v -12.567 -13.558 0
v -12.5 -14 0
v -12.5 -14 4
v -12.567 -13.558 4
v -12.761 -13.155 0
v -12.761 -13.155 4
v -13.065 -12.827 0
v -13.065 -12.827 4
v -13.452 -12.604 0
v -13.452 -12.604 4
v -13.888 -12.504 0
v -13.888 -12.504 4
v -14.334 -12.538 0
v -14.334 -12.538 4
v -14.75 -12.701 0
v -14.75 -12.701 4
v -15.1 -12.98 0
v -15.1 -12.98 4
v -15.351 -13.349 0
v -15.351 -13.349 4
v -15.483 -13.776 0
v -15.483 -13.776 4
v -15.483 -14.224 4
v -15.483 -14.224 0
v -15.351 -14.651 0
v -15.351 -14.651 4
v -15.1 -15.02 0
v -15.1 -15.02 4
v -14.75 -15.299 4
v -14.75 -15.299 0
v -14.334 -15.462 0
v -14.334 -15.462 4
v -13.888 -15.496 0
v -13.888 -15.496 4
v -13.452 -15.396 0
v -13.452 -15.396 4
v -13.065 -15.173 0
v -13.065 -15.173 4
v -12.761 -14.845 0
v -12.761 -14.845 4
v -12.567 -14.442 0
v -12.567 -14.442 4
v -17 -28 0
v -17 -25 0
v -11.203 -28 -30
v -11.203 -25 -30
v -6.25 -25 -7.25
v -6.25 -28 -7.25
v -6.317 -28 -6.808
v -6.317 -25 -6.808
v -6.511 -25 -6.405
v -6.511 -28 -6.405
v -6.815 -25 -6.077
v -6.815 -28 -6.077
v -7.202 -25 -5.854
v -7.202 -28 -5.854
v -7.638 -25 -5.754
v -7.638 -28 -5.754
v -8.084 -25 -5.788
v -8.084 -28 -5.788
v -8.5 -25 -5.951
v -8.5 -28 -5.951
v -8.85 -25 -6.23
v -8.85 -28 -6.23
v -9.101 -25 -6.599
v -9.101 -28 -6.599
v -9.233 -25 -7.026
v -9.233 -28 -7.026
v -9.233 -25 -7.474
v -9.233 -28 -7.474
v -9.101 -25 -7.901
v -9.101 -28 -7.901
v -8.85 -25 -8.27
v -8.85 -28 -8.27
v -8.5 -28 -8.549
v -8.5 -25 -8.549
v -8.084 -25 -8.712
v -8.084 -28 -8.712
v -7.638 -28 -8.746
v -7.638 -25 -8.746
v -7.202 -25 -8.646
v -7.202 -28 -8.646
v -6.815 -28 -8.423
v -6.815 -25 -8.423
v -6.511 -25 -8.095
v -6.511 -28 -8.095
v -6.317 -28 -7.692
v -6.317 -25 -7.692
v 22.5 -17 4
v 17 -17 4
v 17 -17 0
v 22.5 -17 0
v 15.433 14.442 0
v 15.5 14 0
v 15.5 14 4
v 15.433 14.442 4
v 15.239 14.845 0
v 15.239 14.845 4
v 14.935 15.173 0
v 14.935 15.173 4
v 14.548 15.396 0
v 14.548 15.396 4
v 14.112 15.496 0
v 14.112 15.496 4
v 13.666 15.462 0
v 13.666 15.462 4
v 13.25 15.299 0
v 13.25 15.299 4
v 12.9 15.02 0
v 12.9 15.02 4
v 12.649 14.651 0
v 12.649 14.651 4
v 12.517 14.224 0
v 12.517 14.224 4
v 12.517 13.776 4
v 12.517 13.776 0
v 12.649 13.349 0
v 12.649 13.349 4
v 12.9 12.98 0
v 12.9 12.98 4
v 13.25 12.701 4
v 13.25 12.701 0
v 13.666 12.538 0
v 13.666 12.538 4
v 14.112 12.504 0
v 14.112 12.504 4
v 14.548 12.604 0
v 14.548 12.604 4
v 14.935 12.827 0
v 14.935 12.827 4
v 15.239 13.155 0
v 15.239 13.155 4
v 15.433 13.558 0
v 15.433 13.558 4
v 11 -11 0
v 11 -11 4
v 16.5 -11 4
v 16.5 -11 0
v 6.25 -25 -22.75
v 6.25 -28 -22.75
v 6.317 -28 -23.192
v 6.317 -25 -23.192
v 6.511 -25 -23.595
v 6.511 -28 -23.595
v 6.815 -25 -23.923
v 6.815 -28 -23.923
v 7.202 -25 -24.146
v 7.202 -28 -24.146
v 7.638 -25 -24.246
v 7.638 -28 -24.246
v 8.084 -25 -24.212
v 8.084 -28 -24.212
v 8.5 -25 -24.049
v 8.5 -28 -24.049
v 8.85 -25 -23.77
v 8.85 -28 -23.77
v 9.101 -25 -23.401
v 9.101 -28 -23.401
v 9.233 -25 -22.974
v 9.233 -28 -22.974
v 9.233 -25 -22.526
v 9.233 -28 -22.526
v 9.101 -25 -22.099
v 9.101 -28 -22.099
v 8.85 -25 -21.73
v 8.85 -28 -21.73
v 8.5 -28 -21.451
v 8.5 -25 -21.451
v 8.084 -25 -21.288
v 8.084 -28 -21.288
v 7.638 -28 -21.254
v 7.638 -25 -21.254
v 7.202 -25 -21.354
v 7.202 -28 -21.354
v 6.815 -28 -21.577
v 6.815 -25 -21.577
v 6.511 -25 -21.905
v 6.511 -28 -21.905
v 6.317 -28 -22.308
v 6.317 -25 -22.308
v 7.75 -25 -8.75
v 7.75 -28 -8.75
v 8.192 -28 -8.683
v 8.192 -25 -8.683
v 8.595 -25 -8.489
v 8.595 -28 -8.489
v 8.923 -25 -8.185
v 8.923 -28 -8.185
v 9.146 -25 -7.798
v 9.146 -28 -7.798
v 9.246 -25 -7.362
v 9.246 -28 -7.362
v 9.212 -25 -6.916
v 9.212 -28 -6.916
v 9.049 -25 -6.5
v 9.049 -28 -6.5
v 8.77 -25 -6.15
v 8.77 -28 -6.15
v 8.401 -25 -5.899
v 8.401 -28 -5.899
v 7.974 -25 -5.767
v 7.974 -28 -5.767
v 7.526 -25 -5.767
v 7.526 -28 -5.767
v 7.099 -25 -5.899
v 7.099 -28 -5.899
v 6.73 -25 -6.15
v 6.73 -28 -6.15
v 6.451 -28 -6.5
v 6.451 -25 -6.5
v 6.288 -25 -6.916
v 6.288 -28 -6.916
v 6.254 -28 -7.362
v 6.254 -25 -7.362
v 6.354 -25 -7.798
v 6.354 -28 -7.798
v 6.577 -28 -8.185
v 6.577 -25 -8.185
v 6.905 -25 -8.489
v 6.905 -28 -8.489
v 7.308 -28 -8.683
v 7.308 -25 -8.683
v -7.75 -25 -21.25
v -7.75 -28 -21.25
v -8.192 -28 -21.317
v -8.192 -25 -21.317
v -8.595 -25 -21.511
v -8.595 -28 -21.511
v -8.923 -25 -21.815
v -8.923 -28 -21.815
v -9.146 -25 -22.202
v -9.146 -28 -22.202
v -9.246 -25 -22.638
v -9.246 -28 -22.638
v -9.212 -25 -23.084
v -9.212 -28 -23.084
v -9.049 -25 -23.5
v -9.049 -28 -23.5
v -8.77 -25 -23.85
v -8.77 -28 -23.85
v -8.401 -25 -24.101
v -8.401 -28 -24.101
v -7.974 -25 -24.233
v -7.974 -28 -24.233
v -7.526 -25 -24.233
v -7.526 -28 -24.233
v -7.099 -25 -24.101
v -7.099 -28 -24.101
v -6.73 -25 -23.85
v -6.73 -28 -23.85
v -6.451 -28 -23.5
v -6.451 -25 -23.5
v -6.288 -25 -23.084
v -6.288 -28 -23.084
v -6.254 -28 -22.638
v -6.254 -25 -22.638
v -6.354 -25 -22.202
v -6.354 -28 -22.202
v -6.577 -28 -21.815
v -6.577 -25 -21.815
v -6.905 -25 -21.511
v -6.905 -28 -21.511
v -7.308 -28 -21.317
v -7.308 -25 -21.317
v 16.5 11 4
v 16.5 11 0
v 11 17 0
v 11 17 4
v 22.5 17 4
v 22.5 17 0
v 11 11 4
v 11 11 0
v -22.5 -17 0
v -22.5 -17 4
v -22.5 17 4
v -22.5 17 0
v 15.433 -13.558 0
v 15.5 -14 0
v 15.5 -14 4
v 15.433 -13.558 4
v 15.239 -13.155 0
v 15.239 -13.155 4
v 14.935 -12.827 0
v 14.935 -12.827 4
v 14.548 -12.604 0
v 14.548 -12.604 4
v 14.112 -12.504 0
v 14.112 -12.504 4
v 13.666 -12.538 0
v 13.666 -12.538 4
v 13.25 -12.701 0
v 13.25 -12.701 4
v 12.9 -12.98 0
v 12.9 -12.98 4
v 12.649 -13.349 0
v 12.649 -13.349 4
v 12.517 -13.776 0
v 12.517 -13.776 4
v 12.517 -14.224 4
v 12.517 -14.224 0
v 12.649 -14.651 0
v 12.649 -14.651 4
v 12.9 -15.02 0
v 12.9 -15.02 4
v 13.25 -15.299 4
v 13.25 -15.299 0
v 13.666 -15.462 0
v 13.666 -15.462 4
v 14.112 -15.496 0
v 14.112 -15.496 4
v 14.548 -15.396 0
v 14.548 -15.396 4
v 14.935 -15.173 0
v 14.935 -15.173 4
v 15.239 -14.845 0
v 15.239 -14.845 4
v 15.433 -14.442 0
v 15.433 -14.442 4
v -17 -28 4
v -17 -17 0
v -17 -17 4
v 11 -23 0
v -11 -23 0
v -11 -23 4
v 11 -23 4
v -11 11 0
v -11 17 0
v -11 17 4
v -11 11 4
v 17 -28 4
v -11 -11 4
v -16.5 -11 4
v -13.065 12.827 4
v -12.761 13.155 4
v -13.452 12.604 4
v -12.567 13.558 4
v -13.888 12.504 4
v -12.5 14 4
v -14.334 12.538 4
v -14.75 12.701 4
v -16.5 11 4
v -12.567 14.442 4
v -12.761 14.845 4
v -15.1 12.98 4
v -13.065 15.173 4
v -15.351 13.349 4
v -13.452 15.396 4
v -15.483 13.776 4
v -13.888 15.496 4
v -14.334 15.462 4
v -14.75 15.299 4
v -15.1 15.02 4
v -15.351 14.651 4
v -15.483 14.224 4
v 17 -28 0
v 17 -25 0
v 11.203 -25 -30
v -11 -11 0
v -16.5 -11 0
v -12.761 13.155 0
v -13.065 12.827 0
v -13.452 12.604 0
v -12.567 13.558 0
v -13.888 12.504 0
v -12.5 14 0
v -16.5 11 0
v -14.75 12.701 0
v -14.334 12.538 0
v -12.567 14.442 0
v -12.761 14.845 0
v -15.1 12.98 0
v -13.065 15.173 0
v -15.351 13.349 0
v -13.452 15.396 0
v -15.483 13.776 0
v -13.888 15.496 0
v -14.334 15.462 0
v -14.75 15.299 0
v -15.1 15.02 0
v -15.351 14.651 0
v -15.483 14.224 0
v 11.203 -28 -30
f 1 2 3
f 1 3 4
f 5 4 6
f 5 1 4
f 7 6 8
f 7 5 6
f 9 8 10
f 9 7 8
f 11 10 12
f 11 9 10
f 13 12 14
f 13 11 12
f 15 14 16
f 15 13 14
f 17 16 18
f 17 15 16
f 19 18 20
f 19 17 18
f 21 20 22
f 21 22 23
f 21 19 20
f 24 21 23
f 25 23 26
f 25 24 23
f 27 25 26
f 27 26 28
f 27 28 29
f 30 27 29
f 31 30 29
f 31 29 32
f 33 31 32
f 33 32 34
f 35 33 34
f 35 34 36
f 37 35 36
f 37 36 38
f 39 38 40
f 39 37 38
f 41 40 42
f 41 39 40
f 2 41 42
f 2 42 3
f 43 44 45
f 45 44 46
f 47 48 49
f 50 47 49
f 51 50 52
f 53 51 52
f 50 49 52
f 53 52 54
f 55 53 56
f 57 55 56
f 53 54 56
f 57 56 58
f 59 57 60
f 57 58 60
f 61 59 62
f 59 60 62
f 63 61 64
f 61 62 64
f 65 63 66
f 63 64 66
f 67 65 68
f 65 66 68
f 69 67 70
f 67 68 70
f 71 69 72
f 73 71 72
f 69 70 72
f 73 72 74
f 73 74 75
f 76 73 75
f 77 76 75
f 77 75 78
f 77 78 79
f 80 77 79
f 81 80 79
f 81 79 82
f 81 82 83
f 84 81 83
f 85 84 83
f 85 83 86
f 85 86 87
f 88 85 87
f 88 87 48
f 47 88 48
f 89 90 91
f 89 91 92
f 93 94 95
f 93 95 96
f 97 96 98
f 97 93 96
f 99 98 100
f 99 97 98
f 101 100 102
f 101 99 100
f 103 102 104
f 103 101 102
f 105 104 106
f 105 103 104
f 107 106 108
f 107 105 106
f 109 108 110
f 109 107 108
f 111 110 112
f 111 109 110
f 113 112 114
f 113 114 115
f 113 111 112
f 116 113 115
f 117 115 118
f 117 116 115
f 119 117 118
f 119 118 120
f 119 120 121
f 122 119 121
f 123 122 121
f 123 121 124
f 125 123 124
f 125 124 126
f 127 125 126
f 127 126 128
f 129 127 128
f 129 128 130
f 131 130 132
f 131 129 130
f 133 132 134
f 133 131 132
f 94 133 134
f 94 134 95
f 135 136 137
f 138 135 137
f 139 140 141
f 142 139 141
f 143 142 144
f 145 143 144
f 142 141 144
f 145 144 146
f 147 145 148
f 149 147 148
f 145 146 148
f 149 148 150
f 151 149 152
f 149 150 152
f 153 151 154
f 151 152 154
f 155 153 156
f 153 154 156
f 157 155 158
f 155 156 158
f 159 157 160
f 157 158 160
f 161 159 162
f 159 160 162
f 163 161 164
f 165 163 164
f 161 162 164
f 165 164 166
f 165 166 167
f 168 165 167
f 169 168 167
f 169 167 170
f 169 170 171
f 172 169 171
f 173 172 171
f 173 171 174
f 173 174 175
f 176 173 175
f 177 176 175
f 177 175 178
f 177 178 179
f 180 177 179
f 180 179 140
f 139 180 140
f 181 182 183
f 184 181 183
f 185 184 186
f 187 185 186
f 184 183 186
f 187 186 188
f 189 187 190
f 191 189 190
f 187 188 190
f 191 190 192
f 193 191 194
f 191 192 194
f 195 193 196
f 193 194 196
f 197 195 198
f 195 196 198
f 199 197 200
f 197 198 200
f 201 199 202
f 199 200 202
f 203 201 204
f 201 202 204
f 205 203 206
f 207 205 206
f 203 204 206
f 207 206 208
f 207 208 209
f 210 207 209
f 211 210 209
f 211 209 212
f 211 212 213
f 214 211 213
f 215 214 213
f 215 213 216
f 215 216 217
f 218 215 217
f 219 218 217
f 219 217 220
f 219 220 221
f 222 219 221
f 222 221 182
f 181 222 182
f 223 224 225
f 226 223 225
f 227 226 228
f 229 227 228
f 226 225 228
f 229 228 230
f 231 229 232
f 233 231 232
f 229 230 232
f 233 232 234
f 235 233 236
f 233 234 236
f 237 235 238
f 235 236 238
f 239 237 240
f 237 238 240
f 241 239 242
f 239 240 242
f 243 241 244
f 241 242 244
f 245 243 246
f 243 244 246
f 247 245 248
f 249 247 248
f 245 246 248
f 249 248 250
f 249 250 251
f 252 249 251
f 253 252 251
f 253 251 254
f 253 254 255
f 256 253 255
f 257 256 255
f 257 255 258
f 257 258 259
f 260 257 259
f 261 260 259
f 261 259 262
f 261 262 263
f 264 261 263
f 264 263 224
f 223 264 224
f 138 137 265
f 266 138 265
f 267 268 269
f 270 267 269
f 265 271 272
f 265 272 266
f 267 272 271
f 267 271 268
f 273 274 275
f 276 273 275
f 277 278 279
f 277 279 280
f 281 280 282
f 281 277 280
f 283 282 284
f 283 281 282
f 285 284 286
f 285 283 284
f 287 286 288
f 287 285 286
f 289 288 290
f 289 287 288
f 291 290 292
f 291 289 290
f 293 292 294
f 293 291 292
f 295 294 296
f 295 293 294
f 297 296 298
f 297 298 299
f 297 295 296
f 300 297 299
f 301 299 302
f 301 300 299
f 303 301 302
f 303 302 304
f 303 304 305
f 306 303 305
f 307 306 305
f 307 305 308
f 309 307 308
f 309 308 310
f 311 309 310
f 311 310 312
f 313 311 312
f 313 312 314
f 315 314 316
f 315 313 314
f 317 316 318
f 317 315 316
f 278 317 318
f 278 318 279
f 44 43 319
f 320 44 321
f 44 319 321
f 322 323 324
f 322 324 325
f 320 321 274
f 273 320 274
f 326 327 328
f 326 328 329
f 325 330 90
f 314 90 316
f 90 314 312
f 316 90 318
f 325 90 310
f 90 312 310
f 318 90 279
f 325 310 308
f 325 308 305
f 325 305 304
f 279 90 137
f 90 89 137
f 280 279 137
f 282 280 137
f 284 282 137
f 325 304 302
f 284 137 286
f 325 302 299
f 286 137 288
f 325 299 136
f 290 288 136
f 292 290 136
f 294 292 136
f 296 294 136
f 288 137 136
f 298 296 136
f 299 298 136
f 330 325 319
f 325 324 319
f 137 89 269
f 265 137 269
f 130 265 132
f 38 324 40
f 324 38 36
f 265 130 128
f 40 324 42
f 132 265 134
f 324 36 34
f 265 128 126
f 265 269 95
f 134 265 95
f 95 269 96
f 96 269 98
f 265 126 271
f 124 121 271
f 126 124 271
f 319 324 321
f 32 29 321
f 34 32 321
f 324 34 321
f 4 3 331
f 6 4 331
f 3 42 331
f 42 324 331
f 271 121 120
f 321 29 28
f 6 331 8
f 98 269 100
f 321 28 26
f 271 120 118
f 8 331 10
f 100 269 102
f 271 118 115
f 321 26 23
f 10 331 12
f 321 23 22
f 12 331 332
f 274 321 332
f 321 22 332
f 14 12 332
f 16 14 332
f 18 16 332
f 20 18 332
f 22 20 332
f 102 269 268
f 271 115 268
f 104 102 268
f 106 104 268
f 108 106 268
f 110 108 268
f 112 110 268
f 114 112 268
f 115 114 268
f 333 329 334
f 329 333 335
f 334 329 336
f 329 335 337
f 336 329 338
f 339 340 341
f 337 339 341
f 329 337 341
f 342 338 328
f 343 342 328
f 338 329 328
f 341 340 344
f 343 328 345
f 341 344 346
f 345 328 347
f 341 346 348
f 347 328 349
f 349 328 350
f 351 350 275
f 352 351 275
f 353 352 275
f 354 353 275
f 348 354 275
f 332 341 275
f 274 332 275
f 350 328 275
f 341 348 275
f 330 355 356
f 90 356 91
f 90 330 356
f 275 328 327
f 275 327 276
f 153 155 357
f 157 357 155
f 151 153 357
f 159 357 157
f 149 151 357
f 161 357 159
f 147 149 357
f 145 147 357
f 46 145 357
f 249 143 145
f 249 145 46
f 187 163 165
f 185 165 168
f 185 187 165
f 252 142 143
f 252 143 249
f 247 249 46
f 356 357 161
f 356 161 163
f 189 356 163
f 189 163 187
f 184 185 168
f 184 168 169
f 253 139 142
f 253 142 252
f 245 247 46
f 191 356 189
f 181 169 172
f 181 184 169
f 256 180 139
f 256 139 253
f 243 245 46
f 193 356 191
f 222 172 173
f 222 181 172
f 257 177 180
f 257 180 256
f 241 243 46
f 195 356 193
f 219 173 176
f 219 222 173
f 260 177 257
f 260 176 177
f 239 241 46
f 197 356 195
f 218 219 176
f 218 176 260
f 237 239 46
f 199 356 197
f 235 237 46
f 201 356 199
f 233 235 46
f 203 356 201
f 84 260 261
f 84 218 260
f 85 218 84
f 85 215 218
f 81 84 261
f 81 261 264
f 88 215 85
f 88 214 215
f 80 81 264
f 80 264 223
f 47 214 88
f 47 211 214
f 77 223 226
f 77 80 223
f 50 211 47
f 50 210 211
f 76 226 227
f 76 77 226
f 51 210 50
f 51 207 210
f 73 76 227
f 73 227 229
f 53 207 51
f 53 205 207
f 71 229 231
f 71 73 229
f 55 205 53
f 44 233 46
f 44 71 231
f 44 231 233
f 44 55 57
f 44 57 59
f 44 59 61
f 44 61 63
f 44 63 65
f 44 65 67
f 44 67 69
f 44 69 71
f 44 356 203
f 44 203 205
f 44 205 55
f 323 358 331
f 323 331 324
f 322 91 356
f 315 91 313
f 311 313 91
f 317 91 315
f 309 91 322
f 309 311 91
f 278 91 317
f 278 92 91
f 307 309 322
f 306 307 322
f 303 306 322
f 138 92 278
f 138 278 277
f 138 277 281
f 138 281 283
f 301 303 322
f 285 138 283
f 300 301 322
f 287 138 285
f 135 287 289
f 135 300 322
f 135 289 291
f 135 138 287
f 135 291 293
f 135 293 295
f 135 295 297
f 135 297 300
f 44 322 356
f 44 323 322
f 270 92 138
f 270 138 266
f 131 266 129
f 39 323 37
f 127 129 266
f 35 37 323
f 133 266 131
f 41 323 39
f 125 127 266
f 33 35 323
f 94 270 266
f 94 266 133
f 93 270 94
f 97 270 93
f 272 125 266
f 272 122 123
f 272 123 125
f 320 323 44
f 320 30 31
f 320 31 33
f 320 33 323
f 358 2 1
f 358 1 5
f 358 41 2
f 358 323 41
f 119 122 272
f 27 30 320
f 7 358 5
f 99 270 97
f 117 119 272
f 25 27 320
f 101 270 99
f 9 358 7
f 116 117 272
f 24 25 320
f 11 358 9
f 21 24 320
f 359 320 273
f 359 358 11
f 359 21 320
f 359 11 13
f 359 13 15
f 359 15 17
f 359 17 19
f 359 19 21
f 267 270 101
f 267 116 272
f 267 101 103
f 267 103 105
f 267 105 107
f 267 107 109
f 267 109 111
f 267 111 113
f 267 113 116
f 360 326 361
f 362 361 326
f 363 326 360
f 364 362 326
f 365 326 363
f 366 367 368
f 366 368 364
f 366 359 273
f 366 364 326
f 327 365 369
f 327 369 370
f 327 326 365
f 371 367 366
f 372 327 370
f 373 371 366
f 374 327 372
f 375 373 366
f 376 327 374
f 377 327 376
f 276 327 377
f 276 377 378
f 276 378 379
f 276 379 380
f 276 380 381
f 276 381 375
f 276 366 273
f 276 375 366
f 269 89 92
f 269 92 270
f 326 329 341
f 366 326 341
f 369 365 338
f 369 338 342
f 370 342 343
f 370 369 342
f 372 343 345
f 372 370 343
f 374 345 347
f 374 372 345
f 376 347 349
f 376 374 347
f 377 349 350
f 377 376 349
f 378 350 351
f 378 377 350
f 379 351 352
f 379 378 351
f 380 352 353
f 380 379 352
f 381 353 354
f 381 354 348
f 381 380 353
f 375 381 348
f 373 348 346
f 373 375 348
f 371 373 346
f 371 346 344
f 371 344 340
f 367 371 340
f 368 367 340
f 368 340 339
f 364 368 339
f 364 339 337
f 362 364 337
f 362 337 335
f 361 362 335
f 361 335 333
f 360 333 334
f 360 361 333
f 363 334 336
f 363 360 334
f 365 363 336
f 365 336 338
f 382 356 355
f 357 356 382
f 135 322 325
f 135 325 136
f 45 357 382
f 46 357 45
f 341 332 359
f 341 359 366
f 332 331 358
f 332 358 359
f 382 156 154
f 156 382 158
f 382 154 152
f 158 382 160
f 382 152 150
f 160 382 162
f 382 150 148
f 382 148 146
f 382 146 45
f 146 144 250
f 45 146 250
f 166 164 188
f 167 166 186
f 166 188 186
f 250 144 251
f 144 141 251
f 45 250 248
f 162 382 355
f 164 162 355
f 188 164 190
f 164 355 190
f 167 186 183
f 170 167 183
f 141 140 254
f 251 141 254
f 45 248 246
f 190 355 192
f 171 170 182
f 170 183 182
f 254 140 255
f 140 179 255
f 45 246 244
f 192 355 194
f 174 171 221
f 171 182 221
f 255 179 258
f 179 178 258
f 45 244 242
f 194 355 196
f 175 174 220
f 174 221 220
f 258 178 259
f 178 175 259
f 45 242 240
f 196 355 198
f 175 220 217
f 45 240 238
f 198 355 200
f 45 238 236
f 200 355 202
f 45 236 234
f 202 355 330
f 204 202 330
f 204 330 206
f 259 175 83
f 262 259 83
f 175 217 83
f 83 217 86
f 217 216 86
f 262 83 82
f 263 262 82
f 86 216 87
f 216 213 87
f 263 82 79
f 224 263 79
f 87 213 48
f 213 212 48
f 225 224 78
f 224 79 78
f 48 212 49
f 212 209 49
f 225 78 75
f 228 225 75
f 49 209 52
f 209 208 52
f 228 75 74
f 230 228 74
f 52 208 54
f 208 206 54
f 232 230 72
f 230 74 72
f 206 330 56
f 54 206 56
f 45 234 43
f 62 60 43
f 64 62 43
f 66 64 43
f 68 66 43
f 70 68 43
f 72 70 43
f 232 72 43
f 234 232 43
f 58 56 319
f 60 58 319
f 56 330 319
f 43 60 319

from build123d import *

# Parameters (mm, degrees)
SKETCH1_R             = 1.5
BOSS_EXTRUDE1_DEPTH   = 4
SKETCH2_W             = 34
SKETCH2_H             = 3
BOSS_EXTRUDE2_DEPTH   = 30
F_3_0MM_DOWEL_HOLE1_D = 3
CIRPATTERN1_COUNT     = 4
CUT_EXTRUDE1_DEPTH    = 31
SKETCH7_W             = 5.5
SKETCH7_H             = 34
BOSS_EXTRUDE3_DEPTH   = 4
SKETCH8_W             = 5.5
SKETCH8_H             = 22
CUT_EXTRUDE2_DEPTH    = 32


with BuildPart() as part:
    # Sketch1 → Boss-Extrude1 (new body)
    with BuildSketch(Plane.XY):
        Polygon((11, 17), (17, 17), (17, -28), (-17, -28), (-17, 17), (-11, 17), (-11, -23), (11, -23), align=None)
        with Locations((-14, 14)):
            Circle(SKETCH1_R, mode=Mode.SUBTRACT)
        with Locations((14, 14)):
            Circle(SKETCH1_R, mode=Mode.SUBTRACT)
        with Locations((14, -14)):
            Circle(SKETCH1_R, mode=Mode.SUBTRACT)
        with Locations((-14, -14)):
            Circle(SKETCH1_R, mode=Mode.SUBTRACT)
    extrude(amount=BOSS_EXTRUDE1_DEPTH)

    # Sketch2 → Boss-Extrude2 (add)
    with BuildSketch(Plane(origin=(0, 0, 0), x_dir=(-1, 0, 0), z_dir=(0, 0, -1))):
        with Locations((0, -26.5)):
            Rectangle(SKETCH2_W, SKETCH2_H)
    extrude(amount=BOSS_EXTRUDE2_DEPTH)

    # Ø3.0mm Dowel Hole1 (through all)
    with Locations(Plane(origin=(0, -25, 0), x_dir=(1, 0, 0), z_dir=(0, 1, 0))):
        with Locations((7.75, 22.75)):
            f_3_0mm_dowel_hole1 = Hole(F_3_0MM_DOWEL_HOLE1_D / 2)

    # CirPattern1: Ø3.0mm Dowel Hole1 ×4 about axis
    cirpattern1_axis = Axis((0, 0, -15), (0, 1, 0))
    for i in range(1, CIRPATTERN1_COUNT):
        add(f_3_0mm_dowel_hole1.rotate(cirpattern1_axis, i * 360 / CIRPATTERN1_COUNT), mode=Mode.SUBTRACT)

    # Sketch6 → Cut-Extrude1 (cut)
    with BuildSketch(Plane(origin=(0, -25, 0), x_dir=(1, 0, 0), z_dir=(0, 1, 0))):
        Polygon((17, 0), (11.20263996, 30), (17, 30), align=None)
    cut_extrude1 = extrude(amount=-CUT_EXTRUDE1_DEPTH, mode=Mode.SUBTRACT)

    # Mirror1: Cut-Extrude1 across plane
    add(cut_extrude1.mirror(Plane(origin=(0, 0, 0), x_dir=(0, 0, 1), z_dir=(1, 0, 0))), mode=Mode.SUBTRACT)

    # Sketch7 → Boss-Extrude3 (add)
    with BuildSketch(Plane.XY.offset(4)):
        with Locations((19.75, 0)):
            Rectangle(SKETCH7_W, SKETCH7_H)
    boss_extrude3 = extrude(amount=-BOSS_EXTRUDE3_DEPTH)

    # Sketch8 → Cut-Extrude2 (cut)
    with BuildSketch(Plane.XY.offset(4)):
        with Locations((13.75, 0)):
            Rectangle(SKETCH8_W, SKETCH8_H)
    cut_extrude2 = extrude(amount=-CUT_EXTRUDE2_DEPTH, mode=Mode.SUBTRACT)

    # Mirror2: Boss-Extrude3 across plane
    add(boss_extrude3.mirror(Plane(origin=(0, 0, 0), x_dir=(0, 0, 1), z_dir=(1, 0, 0))))

    # Mirror3: Cut-Extrude2 across plane
    add(cut_extrude2.mirror(Plane(origin=(0, 0, 0), x_dir=(0, 0, 1), z_dir=(1, 0, 0))), mode=Mode.SUBTRACT)


solid = part.part
